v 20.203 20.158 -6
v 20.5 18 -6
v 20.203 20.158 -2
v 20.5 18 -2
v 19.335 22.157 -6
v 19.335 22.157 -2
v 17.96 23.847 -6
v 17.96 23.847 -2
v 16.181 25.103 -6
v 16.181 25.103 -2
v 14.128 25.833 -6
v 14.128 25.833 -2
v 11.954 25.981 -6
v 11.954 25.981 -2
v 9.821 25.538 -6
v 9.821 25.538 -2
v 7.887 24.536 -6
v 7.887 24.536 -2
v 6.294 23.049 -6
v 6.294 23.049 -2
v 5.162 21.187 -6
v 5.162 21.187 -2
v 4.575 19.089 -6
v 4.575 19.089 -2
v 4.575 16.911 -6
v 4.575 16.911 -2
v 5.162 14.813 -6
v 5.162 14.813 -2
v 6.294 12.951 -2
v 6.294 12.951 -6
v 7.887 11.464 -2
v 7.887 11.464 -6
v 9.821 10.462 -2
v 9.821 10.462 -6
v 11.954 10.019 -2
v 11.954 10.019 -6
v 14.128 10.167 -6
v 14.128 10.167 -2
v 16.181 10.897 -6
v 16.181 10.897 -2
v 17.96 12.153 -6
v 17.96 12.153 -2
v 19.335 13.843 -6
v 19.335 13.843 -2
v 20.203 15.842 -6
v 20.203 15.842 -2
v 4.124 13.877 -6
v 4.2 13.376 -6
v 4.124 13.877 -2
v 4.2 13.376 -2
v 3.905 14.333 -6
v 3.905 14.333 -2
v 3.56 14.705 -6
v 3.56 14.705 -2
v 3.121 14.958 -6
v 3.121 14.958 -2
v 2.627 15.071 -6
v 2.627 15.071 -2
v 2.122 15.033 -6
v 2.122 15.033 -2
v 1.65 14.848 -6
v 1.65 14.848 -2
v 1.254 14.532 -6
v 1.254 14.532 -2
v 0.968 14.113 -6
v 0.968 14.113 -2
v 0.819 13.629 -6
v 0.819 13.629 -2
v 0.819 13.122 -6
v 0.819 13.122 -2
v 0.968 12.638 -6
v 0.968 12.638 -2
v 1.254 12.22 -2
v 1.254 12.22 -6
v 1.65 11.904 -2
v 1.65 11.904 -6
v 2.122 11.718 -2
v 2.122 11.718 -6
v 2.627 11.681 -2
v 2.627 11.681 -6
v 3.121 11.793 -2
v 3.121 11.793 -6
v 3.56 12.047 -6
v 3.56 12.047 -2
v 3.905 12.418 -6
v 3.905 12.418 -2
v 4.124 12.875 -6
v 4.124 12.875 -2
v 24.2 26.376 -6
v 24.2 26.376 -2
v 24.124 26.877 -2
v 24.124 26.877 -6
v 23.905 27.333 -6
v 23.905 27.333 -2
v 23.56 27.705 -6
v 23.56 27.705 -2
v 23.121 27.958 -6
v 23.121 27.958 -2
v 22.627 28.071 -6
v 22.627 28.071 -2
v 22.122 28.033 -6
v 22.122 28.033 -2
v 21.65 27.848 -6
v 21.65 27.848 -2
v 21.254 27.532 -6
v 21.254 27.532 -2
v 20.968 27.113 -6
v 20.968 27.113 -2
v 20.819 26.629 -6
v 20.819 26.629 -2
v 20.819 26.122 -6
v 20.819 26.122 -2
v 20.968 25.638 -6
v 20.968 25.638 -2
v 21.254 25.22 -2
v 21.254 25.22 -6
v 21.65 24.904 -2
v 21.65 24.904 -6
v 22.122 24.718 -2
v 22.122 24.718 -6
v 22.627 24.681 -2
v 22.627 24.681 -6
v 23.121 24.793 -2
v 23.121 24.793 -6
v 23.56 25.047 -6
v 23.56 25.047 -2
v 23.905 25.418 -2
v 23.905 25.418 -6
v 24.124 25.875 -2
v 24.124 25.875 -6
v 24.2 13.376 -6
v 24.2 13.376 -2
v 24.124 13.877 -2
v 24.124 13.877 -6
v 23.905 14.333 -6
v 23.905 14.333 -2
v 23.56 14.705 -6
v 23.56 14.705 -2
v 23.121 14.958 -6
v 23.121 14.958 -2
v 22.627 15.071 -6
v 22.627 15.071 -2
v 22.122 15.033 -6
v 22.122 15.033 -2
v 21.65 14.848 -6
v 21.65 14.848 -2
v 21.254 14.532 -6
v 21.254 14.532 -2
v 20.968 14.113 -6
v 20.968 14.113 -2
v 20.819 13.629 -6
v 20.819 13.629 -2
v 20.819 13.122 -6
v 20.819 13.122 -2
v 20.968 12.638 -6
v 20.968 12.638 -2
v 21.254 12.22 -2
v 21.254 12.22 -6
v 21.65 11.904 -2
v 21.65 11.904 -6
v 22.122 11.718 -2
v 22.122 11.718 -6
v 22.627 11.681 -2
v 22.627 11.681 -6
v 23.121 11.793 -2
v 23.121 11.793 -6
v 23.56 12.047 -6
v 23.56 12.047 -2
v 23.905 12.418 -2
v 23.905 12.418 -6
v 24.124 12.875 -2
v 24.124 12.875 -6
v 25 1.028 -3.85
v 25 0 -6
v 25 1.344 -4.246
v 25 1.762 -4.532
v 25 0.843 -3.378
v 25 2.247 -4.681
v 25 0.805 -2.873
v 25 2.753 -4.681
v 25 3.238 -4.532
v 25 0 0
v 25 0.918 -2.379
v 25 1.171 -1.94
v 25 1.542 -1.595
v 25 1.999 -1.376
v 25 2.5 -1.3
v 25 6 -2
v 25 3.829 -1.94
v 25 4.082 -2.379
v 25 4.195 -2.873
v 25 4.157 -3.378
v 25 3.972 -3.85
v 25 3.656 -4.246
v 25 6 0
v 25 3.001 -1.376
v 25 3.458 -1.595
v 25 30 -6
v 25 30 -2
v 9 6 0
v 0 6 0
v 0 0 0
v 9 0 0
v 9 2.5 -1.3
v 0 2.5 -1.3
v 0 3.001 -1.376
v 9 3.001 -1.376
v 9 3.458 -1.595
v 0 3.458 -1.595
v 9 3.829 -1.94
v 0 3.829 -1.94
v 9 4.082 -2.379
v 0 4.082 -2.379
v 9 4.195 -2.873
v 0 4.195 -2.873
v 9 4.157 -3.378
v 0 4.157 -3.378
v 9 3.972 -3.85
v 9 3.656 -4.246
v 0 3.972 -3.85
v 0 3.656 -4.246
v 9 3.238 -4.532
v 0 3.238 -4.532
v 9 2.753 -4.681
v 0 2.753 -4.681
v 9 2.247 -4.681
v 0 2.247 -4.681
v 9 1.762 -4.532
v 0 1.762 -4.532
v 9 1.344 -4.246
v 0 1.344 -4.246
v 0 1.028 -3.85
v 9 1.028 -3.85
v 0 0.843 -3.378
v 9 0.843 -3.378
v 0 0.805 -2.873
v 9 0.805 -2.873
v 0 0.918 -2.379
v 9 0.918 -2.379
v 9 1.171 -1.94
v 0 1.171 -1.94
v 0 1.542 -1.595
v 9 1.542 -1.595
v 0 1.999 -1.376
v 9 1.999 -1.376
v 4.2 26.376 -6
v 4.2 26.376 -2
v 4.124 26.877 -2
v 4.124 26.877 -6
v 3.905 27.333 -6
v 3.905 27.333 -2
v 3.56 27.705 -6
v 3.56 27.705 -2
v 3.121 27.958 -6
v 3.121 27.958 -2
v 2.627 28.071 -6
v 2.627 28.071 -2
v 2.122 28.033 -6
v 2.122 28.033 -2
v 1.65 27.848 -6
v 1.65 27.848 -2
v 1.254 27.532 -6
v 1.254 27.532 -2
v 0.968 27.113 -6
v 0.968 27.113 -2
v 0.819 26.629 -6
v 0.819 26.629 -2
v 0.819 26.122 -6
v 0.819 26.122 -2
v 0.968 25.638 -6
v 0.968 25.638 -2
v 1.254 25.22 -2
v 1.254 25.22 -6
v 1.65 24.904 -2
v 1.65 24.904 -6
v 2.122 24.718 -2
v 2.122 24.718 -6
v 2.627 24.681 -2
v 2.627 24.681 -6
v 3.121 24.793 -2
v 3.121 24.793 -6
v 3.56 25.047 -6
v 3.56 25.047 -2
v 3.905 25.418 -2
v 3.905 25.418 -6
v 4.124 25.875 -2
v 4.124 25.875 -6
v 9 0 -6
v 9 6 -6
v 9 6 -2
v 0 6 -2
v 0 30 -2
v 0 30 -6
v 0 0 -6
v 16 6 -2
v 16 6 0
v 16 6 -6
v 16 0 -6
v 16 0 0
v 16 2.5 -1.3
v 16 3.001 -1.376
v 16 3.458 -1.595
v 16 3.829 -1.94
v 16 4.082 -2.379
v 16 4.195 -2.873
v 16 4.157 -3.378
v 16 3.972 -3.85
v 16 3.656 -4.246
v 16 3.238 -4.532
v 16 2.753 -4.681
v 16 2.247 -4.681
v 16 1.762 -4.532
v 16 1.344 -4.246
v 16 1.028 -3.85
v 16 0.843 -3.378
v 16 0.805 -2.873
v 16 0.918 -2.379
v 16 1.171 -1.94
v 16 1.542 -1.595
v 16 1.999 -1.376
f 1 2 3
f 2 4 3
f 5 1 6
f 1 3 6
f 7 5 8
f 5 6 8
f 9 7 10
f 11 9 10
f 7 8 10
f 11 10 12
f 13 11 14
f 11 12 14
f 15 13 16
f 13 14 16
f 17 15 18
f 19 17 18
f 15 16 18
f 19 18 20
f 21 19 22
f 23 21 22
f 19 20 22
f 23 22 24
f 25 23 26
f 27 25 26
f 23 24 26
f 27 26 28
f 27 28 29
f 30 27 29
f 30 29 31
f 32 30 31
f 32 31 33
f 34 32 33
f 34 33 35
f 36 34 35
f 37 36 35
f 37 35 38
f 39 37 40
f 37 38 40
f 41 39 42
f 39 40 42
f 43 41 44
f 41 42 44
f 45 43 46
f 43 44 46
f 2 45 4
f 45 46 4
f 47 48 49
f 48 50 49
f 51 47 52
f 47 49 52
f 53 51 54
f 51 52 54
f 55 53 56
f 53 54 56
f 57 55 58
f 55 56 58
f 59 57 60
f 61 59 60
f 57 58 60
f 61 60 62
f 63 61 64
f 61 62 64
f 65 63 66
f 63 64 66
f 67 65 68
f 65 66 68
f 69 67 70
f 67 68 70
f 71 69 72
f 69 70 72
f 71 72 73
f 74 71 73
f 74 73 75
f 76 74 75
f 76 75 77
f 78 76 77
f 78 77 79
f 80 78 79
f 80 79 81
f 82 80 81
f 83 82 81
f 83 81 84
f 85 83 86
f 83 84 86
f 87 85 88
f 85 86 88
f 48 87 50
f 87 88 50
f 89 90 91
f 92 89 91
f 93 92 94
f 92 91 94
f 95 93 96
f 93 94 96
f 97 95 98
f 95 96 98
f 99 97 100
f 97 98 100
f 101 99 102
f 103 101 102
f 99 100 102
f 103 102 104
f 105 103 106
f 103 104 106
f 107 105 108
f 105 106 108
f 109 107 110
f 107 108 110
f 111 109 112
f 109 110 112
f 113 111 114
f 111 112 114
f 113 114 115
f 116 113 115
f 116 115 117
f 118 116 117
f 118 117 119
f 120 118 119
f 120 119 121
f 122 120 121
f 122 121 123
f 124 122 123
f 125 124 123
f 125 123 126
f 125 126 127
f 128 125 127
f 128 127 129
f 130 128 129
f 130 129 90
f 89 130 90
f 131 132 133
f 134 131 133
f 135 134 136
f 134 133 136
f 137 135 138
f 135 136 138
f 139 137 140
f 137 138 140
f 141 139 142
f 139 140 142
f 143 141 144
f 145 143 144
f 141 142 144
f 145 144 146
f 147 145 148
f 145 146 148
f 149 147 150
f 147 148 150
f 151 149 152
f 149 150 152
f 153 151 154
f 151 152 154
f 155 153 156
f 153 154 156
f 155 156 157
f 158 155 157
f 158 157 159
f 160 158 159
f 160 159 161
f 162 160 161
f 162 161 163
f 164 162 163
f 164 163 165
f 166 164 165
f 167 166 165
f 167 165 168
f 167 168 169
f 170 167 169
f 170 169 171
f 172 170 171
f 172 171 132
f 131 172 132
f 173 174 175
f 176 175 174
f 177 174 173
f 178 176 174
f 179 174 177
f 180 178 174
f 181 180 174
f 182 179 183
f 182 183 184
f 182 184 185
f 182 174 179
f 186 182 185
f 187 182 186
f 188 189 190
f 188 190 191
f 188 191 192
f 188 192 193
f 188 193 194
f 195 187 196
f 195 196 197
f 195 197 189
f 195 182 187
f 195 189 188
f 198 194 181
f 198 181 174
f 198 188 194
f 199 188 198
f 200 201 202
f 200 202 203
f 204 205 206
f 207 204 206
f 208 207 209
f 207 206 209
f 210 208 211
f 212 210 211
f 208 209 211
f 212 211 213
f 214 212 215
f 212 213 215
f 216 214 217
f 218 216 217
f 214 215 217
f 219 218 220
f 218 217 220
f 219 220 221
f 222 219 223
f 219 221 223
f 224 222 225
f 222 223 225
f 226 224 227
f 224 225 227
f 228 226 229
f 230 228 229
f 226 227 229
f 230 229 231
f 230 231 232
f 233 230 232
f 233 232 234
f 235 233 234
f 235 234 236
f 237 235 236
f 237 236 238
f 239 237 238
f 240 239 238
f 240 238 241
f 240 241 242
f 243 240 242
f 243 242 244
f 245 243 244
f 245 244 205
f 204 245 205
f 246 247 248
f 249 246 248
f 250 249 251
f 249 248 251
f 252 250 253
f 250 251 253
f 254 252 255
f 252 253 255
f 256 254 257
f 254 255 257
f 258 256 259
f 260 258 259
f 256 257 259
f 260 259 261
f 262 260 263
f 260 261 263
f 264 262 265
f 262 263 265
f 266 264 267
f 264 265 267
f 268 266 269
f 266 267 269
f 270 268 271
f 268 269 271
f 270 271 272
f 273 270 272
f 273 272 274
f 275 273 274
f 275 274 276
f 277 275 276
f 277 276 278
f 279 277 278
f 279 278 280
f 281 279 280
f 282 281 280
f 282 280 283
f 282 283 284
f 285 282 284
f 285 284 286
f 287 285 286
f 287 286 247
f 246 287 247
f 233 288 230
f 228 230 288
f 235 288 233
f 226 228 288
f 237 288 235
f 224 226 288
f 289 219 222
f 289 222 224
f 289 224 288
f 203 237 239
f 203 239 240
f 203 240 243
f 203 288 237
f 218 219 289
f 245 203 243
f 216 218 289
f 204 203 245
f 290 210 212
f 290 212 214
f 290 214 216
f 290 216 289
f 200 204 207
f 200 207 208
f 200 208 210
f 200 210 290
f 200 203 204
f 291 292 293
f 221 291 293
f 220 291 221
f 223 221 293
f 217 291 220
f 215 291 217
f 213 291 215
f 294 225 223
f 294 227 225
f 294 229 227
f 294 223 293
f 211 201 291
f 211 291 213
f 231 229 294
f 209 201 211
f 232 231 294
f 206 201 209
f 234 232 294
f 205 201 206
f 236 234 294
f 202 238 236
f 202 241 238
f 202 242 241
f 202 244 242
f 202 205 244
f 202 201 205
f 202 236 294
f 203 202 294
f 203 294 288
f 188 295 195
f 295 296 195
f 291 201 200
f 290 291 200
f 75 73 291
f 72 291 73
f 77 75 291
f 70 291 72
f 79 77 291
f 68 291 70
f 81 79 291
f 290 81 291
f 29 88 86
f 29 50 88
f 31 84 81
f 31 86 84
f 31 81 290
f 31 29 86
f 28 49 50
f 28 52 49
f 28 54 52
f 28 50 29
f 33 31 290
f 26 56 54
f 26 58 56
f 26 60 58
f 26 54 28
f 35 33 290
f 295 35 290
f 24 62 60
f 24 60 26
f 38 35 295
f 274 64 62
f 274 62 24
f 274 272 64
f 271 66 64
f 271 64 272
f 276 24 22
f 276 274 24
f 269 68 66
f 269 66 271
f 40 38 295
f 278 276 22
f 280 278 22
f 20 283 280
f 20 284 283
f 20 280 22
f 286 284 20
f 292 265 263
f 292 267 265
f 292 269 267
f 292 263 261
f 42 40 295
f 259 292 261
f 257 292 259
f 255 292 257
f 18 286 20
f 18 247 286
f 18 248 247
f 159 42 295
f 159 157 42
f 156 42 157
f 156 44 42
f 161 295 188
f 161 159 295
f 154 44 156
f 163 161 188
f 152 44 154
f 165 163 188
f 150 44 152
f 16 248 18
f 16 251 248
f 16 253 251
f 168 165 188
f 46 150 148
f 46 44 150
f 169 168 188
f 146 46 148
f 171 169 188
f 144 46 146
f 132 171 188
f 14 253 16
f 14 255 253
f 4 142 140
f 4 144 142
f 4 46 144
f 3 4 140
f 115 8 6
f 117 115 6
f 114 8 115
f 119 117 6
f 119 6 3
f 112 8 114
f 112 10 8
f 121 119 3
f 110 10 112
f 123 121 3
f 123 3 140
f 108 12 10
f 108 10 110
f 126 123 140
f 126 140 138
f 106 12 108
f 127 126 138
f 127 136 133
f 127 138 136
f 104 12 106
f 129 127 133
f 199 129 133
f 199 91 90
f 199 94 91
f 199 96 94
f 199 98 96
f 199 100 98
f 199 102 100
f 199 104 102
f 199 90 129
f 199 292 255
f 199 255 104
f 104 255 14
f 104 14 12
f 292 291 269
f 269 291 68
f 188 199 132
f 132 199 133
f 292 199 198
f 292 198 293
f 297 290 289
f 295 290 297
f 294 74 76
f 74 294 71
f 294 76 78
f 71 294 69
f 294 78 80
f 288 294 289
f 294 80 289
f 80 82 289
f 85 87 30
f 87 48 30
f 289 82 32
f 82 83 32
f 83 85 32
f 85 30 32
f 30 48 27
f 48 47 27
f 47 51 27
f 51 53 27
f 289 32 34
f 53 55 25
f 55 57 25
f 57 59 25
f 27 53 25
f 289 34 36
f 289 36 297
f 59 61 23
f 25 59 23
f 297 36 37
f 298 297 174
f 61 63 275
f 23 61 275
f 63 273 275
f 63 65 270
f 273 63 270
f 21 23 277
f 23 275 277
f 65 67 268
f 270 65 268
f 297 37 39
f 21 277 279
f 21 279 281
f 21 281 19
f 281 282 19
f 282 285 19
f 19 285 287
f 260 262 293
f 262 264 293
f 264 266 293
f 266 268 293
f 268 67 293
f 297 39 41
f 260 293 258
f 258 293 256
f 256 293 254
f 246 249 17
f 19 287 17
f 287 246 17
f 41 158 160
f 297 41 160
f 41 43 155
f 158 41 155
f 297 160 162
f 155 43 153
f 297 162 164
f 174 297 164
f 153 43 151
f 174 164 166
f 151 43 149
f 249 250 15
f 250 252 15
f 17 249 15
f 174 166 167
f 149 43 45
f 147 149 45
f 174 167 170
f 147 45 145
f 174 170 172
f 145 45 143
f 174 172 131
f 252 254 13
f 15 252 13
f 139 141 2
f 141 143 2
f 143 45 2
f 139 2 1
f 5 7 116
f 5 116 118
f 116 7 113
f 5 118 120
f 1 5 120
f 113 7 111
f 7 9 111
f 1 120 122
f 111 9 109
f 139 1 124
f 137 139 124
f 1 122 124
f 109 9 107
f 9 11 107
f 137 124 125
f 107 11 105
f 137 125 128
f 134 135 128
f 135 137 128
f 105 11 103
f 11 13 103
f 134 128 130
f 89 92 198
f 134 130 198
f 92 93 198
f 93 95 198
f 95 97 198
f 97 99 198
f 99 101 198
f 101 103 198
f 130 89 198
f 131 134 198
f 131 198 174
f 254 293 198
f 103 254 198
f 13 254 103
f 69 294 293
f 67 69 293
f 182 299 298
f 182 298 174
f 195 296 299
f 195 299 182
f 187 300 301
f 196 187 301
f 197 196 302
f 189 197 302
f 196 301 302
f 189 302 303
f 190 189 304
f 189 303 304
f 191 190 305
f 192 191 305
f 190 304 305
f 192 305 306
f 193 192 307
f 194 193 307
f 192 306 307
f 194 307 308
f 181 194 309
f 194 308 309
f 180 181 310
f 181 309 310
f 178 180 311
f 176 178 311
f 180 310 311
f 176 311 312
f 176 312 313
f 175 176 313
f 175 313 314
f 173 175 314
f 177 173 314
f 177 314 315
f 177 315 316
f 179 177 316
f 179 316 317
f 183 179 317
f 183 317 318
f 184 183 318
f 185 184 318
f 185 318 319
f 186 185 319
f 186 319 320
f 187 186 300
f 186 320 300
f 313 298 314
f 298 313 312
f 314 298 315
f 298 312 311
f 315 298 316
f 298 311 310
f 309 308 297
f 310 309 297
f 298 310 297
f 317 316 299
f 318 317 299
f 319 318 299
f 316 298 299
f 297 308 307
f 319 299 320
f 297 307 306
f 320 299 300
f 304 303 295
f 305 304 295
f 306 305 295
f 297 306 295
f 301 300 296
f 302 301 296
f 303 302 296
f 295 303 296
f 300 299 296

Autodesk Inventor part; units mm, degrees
ref_plane "YZ Plane" through (0, 0, 0) normal (1, 0, 0) x (0, 1, 0)
ref_plane "XZ Plane" through (0, 0, 0) normal (0, 1, 0) x (-1, 0, 0)
ref_plane "XY Plane" through (0, 0, 0) normal (0, 0, 1) x (1, 0, 0)
sketch "Skizze1" plane through (0, 0, 0) normal (0, 0, 1) x (1, 0, 0)
  line L0 (0, 0) -> (25, 0)
  line L1 (25, 0) -> (25, 30)
  line L2 (25, 30) -> (0, 30)
  line L3 (0, 30) -> (0, 0)
  dimension "d0" = 30
  dimension "d1" = 25
extrude "Extrusion1" add sketch "Skizze1" against normal blind 6
sketch "Skizze2" plane through (0, 0, 0) normal (0, 0, 1) x (1, 0, 0)
  circle A0 centre (12.5, 18) radius 8
  line L0 (25, 0) -> (25, 30) projected
  line L1 (0, 0) -> (25, 0) projected
  dimension "d4" = 16
  dimension "d5" = 12.5
  dimension "d6" = 18
extrude "Extrusion2" cut sketch "Skizze2" against normal blind 10
sketch "Skizze4" plane through (0, 0, 0) normal (0, 0, 1) x (1, 0, 0)
  line L0 (2.5, 13.3758) -> (22.5, 13.3758) construction
  line L1 (22.5, 13.3758) -> (22.5, 26.3758) construction
  line L2 (22.5, 26.3758) -> (2.5, 26.3758) construction
  line L3 (2.5, 26.3758) -> (2.5, 13.3758) construction
  line L4 (25, 0) -> (25, 30) construction
  circle A0 centre (2.5, 26.3758) radius 1.7
  circle A1 centre (22.5, 26.3758) radius 1.7
  circle A2 centre (22.5, 13.3758) radius 1.7
  circle A3 centre (2.5, 13.3758) radius 1.7
  point P0 (0, 0)
  point P1 (25, 3.0001)
  dimension "d12" = 20
  dimension "d13" = 13
  dimension "d14" = 2.5
  dimension "d15" = 3.4
  dimension "d16" = 3.4
  dimension "d17" = 3.4
  dimension "d18" = 3.4
extrude "Extrusion4" cut sketch "Skizze4" against normal blind 10
sketch "Skizze6" plane through (0, 0, 0) normal (0, 0, 1) x (1, 0, 0)
  line L0 (25, 0) -> (0, 0) projected
  line L1 (25, 0) -> (16, 0)
  line L2 (16, 0) -> (16, 6)
  line L3 (16, 6) -> (25, 6)
  line L4 (25, 6) -> (25, 0)
  line L5 (0, 0) -> (9, 0)
  line L6 (9, 0) -> (9, 6)
  line L7 (9, 6) -> (0, 6)
  line L8 (0, 6) -> (0, 0)
  line L9 (9, 6) -> (16, 6)
  line L10 (16, 6) -> (16, 0)
  line L11 (16, 0) -> (9, 0)
  line L12 (9, 0) -> (9, 6)
  dimension "d21" = 9
  dimension "d22" = 9
  dimension "d23" = 6
extrude "Extrusion5" cut sketch "Skizze6" against normal blind 10 contours L0 L6 L9 L2
sketch "Skizze7" plane through (0, 0, 0) normal (-1, 0, 0) x (0, 0, 1)
  circle A0 centre (-3, 2.5) radius 1.7
  line L0 (0, 30) -> (0, 0) projected
  line L1 (0, 0) -> (-6, 0) projected
  dimension "d26" = 3.4
  dimension "d27" = 3
  dimension "d28" = 2.5
extrude "Extrusion6" cut sketch "Skizze7" against normal blind 40
sketch "Skizze8" plane through (0, 0, 0) normal (0, 0, 1) x (1, 0, 0)
  line L0 (16, 6) -> (16, 0) projected
  line L1 (16, 0) -> (25, 0) projected
  line L2 (25, 0) -> (25, 30) projected
  line L3 (25, 30) -> (0, 30) projected
  line L4 (0, 30) -> (0, 0) projected
  line L5 (0, 0) -> (9, 0) projected
  line L6 (9, 0) -> (9, 6) projected
  line L7 (9, 6) -> (16, 6) projected
  circle A0 centre (22.5, 13.3758) radius 1.7 projected
  circle A1 centre (2.5, 26.3758) radius 1.7 projected
  circle A2 centre (22.5, 26.3758) radius 1.7 projected
  circle A3 centre (2.5, 13.3758) radius 1.7 projected
  circle A4 centre (12.5, 18) radius 8 projected
  line L8 (0, 30) -> (0, 0) projected
  line L9 (0, 6) -> (25, 6)
  line L10 (25, 0) -> (25, 30) projected
  line L11 (25, 6) -> (25, 30)
  line L12 (25, 30) -> (0, 30) projected
  line L13 (25, 30) -> (0, 30)
  line L14 (0, 30) -> (0, 6)
extrude "Extrusion7" cut sketch "Skizze8" against normal blind 2 contours L7 L9 L4 L3 L2
properties part number "kamera ot" material "CFK"
